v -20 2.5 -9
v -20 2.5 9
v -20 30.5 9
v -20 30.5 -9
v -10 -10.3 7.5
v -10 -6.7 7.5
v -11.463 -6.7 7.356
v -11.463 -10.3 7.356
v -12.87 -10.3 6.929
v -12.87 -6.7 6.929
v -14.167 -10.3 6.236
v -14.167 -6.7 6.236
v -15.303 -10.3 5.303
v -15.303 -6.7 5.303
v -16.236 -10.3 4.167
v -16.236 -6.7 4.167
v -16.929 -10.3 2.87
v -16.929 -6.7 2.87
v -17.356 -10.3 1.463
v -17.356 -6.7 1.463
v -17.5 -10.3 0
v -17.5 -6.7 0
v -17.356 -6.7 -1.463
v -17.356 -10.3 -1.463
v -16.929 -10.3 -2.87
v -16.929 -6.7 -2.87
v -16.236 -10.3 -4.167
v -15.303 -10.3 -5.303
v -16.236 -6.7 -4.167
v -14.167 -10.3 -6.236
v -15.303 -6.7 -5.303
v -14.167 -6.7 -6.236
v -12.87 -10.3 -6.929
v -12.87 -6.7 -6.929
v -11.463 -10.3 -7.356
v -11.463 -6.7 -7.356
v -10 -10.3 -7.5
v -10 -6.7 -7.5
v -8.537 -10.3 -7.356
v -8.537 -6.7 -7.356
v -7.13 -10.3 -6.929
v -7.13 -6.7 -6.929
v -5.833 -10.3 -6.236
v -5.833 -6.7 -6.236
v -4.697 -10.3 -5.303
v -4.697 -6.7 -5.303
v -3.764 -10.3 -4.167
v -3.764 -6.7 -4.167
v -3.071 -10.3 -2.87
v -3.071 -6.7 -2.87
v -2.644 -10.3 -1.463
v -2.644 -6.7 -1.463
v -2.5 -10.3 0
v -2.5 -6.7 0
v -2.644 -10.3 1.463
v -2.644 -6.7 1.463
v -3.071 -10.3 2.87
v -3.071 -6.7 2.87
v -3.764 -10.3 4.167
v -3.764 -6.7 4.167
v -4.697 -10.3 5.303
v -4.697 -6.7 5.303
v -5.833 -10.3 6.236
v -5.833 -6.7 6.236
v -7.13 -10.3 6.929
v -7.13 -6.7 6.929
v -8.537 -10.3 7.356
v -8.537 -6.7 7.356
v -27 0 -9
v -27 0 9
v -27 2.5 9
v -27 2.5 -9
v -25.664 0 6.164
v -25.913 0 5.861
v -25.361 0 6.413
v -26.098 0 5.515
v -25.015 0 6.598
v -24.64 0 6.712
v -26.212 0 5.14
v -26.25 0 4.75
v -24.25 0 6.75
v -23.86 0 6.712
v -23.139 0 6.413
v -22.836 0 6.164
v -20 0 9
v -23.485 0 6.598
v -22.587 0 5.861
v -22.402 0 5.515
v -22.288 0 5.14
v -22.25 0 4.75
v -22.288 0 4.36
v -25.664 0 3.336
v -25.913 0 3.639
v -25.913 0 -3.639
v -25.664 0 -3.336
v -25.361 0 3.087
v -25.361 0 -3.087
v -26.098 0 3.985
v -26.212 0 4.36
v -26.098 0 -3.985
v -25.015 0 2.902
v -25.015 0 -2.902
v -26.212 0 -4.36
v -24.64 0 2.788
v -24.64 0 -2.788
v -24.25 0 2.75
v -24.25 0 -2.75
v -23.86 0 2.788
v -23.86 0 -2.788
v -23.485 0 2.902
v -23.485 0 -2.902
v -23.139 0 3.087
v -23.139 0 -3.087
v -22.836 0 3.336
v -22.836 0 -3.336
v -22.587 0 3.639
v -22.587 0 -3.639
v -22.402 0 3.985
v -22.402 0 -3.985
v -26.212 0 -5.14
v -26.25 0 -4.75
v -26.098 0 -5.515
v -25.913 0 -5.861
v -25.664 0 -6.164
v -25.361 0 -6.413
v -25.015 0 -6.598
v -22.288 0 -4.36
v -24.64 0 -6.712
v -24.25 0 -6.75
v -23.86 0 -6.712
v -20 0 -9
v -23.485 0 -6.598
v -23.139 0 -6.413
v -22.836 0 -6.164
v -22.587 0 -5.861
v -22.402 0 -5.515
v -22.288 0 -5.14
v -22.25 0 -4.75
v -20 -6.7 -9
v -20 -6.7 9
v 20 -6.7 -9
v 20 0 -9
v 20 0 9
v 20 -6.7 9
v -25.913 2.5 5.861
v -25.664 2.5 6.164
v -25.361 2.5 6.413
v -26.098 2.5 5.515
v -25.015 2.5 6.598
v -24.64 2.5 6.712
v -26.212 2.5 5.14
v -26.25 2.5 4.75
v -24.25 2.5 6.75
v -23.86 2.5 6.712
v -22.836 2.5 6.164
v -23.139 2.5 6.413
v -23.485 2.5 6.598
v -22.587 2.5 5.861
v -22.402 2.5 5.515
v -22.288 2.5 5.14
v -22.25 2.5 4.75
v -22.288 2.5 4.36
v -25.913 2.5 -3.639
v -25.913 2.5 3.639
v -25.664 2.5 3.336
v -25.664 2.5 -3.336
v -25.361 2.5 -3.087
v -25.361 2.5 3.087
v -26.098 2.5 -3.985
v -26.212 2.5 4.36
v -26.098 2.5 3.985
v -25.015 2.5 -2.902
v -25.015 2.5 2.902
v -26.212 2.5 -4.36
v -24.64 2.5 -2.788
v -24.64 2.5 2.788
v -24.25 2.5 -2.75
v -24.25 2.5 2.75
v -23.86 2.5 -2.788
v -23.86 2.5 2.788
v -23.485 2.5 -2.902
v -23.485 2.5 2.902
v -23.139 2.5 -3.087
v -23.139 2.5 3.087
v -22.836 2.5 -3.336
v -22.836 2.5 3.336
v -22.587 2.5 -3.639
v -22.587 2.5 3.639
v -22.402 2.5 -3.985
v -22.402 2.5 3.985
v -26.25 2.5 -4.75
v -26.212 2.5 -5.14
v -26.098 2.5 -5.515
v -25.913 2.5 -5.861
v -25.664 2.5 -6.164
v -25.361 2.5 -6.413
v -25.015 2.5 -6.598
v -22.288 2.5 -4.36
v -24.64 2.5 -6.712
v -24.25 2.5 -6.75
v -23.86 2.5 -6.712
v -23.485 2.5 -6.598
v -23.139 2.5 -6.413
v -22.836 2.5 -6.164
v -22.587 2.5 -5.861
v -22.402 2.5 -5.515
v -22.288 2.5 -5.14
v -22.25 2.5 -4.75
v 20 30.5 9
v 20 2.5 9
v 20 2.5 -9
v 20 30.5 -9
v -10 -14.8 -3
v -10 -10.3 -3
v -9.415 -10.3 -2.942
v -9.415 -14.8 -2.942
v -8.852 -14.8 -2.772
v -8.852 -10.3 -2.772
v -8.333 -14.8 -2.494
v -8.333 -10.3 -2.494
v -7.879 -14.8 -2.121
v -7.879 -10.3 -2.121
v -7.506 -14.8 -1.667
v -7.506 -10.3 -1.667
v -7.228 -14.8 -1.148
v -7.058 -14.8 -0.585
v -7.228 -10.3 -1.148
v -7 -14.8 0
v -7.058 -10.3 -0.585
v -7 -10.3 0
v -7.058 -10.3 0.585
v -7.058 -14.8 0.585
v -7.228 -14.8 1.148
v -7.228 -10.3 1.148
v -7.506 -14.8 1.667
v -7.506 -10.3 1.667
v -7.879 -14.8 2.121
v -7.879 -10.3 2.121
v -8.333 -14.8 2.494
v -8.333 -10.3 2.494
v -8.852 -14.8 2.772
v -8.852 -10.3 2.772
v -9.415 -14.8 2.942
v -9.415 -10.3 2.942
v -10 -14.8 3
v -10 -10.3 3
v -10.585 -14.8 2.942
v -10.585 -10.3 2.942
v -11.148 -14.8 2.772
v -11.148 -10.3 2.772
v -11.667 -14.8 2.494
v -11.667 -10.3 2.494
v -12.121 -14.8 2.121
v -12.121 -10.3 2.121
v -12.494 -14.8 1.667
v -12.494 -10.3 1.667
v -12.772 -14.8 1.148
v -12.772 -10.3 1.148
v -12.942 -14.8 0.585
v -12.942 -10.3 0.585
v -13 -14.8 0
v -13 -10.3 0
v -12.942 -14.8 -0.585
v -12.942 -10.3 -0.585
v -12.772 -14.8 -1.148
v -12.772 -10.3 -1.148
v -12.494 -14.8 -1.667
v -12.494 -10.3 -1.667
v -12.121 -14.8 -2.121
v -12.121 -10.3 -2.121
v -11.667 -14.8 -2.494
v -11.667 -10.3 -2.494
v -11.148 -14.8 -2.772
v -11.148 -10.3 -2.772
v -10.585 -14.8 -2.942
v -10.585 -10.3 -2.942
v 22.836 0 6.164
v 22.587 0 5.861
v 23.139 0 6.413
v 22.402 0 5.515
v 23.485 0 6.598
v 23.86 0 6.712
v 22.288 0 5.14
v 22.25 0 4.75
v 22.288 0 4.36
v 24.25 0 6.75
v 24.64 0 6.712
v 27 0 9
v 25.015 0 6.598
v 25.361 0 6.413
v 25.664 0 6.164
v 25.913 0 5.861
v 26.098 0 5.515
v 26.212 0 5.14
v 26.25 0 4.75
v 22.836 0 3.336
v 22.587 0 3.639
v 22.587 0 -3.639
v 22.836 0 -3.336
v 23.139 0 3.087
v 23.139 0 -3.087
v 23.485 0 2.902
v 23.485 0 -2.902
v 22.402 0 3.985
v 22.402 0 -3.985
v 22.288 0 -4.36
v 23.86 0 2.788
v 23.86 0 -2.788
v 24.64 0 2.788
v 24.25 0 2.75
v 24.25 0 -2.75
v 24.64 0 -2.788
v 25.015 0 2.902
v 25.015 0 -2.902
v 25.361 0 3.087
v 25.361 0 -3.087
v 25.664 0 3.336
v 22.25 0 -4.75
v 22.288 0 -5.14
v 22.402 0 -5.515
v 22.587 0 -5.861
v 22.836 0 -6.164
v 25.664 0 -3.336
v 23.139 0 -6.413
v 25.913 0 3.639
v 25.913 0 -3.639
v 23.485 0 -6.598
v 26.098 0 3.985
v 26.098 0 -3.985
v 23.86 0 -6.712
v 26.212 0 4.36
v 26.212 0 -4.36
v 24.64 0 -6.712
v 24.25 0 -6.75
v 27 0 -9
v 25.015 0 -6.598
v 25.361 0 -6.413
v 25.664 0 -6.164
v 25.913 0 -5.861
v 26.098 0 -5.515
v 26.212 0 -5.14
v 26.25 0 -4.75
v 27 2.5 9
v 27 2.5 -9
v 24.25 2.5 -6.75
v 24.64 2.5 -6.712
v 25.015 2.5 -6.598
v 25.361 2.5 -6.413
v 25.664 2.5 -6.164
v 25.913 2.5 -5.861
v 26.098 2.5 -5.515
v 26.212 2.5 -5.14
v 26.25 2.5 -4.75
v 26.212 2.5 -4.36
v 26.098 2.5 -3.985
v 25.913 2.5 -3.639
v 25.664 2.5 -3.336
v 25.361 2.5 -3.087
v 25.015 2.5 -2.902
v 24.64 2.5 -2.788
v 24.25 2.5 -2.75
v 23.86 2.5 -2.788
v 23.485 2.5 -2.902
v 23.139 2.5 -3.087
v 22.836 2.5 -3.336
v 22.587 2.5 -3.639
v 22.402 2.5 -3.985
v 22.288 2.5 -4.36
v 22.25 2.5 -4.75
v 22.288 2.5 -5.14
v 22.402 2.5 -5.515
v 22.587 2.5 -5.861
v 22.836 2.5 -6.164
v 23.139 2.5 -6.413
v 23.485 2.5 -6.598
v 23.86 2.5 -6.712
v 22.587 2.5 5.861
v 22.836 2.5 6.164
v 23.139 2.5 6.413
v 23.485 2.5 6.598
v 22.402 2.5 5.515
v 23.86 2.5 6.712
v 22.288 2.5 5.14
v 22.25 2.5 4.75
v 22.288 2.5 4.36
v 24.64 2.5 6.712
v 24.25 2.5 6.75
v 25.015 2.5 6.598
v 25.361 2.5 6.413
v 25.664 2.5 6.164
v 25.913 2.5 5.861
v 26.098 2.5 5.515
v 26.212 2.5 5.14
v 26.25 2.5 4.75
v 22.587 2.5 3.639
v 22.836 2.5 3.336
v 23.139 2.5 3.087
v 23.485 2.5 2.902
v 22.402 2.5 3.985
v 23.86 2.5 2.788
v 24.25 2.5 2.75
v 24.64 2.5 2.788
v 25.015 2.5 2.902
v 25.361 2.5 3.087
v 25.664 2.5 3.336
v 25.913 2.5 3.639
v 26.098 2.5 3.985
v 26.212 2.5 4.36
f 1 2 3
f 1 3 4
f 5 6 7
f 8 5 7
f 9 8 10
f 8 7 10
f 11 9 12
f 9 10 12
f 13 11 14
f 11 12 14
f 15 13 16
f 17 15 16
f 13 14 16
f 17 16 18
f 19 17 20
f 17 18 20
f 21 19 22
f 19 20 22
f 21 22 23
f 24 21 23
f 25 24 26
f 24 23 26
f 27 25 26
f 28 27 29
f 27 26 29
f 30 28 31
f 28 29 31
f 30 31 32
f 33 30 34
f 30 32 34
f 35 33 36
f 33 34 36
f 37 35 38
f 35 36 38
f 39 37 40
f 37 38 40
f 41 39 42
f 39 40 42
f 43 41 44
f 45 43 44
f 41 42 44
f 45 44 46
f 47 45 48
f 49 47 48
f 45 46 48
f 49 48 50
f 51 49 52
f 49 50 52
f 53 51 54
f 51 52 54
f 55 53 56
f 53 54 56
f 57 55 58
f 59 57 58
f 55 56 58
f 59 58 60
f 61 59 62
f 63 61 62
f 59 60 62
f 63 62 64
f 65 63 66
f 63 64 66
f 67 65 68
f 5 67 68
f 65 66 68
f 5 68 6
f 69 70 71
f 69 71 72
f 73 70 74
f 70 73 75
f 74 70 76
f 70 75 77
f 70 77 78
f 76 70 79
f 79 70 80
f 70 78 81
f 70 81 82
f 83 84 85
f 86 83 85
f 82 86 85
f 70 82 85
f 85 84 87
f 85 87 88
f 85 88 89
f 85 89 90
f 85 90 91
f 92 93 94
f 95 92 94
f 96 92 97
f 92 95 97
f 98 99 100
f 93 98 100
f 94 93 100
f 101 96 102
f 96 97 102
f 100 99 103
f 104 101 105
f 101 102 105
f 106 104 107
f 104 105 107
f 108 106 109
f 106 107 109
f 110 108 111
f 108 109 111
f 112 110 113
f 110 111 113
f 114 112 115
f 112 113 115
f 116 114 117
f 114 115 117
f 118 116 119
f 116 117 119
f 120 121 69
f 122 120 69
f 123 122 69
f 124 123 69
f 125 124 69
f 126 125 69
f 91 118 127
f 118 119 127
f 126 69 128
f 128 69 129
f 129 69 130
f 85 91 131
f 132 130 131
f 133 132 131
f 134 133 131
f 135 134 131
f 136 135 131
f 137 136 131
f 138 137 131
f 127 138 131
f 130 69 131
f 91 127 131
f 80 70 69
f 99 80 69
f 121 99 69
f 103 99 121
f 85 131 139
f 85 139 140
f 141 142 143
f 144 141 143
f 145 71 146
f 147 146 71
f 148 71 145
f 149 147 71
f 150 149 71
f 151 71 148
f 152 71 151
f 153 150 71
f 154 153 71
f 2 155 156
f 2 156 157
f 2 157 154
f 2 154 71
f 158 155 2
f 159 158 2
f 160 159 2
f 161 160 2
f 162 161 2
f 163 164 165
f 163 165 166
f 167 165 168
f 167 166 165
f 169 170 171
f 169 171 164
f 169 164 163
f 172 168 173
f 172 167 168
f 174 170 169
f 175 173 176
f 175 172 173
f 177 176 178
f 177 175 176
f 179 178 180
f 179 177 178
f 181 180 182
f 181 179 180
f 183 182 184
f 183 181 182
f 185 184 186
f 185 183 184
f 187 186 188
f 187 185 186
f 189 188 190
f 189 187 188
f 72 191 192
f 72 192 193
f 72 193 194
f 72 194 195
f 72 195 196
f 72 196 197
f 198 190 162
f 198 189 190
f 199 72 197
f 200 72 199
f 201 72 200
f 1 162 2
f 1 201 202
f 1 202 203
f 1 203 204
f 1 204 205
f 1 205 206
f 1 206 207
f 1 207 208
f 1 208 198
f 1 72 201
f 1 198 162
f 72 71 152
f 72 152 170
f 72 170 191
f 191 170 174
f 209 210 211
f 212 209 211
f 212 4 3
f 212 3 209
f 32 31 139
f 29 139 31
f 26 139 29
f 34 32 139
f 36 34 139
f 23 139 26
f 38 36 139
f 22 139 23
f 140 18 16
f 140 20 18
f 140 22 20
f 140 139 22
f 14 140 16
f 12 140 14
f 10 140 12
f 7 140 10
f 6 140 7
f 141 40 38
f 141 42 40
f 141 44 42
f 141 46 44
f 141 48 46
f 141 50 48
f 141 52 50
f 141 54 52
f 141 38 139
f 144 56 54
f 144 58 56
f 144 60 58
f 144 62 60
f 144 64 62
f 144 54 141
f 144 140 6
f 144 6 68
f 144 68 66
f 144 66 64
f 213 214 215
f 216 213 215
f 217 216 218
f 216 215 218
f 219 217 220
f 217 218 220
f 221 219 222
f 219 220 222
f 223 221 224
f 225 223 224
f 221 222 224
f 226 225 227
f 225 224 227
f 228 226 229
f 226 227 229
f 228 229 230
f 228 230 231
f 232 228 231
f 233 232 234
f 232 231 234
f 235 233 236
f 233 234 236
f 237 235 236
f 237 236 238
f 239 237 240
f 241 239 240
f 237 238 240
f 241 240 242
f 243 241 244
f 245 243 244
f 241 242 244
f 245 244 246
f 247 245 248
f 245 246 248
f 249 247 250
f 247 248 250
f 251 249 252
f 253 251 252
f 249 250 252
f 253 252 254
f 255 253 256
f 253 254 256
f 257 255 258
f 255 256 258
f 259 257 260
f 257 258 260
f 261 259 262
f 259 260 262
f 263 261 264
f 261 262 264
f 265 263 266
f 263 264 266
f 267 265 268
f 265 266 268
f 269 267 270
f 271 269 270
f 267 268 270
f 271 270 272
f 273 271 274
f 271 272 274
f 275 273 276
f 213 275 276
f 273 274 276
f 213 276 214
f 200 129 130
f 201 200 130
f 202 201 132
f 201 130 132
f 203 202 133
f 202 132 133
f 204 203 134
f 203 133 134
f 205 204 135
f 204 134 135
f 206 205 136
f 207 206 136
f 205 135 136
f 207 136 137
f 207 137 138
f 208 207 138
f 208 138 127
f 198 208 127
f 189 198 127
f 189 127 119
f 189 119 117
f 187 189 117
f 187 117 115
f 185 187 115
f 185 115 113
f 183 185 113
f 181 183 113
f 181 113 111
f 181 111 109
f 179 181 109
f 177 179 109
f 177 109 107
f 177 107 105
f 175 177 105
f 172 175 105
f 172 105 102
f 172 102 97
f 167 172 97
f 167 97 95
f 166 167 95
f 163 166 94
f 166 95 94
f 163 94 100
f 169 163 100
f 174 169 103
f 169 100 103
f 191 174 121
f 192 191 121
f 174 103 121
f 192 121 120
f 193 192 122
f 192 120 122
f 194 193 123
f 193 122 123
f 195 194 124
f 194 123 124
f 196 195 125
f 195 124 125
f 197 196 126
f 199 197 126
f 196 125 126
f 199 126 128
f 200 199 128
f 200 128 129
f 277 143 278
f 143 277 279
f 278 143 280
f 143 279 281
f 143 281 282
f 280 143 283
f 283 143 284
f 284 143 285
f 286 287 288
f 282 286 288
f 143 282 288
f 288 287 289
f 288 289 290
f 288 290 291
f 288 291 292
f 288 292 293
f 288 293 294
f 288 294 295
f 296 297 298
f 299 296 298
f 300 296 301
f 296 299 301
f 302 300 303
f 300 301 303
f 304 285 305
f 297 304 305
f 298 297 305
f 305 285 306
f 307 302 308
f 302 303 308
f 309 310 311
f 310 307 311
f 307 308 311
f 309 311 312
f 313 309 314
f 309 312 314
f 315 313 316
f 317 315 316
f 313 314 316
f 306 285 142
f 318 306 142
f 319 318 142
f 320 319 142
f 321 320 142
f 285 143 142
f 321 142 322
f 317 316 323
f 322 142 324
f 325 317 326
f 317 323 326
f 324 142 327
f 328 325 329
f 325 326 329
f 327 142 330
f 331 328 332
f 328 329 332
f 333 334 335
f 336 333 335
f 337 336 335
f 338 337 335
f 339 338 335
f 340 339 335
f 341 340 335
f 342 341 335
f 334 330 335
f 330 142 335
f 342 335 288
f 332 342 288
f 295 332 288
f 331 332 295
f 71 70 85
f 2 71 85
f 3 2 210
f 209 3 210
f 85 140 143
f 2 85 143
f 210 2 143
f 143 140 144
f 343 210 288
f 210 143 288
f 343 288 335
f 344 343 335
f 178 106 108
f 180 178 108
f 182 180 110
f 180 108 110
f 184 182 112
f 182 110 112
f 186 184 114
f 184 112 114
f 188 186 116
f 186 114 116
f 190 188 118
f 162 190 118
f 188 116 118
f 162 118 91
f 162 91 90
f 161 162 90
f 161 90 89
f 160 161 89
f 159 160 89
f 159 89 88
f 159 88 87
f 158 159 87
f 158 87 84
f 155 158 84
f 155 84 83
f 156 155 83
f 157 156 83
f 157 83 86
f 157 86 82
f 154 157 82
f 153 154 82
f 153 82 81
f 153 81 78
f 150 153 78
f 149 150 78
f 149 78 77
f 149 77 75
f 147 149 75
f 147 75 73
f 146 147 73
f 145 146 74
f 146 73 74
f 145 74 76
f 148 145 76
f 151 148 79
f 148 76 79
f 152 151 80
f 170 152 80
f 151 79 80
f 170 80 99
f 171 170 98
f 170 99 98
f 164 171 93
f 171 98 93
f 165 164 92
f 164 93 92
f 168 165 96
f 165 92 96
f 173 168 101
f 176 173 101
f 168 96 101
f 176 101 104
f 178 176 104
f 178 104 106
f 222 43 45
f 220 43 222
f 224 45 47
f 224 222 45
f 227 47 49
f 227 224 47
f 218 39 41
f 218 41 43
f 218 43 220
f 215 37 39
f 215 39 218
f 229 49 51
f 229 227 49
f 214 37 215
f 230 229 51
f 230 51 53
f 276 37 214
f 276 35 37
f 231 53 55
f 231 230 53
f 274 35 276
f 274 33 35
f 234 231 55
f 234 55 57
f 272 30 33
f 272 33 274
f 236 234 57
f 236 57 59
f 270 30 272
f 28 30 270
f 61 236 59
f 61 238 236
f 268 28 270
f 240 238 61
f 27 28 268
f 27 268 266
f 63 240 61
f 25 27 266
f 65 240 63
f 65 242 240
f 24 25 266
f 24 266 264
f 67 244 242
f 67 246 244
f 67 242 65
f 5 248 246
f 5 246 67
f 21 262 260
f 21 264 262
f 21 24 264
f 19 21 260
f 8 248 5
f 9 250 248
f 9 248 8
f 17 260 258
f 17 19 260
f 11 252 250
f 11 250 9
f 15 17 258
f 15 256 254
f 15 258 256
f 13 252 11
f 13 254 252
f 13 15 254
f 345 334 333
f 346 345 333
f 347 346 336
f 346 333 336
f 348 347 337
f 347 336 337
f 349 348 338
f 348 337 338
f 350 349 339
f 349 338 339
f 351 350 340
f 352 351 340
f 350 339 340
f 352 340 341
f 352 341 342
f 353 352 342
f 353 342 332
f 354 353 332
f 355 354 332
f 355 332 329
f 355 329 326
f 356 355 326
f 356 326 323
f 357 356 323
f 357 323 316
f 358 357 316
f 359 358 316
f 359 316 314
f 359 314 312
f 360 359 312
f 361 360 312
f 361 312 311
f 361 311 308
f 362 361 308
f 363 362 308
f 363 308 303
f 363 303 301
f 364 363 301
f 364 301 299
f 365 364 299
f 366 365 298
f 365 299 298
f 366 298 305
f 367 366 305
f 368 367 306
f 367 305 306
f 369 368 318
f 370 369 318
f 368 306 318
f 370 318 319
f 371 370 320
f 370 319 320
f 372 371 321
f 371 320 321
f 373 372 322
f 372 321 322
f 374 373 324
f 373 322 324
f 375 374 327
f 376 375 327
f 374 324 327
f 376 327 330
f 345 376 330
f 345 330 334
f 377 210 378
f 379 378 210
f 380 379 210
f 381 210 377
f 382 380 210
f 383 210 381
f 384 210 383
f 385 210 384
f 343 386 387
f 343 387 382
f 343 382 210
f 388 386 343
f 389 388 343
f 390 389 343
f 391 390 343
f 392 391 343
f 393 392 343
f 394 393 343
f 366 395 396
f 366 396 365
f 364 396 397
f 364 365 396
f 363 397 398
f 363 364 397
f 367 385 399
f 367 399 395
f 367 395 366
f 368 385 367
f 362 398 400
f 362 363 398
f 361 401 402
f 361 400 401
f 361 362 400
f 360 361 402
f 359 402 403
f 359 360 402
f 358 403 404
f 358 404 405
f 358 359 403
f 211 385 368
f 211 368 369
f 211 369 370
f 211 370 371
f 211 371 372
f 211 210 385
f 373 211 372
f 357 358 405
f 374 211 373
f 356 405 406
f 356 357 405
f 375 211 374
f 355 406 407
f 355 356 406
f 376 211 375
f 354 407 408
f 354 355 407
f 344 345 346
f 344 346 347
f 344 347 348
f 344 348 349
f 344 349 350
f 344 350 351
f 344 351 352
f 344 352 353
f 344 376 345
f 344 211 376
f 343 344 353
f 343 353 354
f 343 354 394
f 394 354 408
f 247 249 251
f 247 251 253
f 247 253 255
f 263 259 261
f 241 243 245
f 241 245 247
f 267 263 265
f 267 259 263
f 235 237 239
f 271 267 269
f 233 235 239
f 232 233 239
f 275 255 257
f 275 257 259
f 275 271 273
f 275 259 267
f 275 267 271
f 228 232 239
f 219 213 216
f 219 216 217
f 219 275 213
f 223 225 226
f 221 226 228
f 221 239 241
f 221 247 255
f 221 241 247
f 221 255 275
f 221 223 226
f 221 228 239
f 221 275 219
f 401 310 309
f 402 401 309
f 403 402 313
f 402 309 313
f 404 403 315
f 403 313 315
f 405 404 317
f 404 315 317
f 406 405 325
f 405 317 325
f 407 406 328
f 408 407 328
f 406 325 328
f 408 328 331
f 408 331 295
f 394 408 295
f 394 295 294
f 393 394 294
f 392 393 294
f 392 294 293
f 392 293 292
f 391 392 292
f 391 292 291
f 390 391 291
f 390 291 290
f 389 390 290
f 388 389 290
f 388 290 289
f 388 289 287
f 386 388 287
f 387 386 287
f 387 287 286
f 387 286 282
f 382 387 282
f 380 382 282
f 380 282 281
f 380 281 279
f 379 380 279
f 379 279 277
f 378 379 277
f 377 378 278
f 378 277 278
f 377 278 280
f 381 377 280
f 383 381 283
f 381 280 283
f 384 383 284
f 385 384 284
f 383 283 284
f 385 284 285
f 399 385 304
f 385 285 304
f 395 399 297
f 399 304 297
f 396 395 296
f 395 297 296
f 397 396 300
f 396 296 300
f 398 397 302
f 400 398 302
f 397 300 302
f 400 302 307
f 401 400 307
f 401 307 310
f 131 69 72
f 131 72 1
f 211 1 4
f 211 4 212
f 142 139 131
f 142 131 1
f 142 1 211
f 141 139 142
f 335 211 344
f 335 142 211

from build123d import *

# Parameters (mm, degrees)
SKETCH_1_W          = 54
SKETCH_1_H          = 18
EXTRUDE_1_DEPTH     = 2.5
SKETCH_2_W          = 40
SKETCH_2_H          = 18
EXTRUDE_2_DEPTH     = 28
SKETCH_3_W          = 40
SKETCH_3_H          = 18
EXTRUDE_3_DEPTH     = 6.7
SKETCH_4_R          = 7.5
EXTRUDE_4_DEPTH     = 3.6
SKETCH_5_R          = 3
EXTRUDE_5_DEPTH     = 4.5
SKETCH_6_R          = 2
CUT_EXTRUDE_1_DEPTH = 4.5


with BuildPart() as part:
    # 草图1 → 凸台-拉伸1 (new body)
    with BuildSketch(Plane(origin=(0, 0, 0), x_dir=(1, 0, 0), z_dir=(0, 1, 0))):
        Rectangle(SKETCH_1_W, SKETCH_1_H)
    extrude(amount=EXTRUDE_1_DEPTH)

    # 草图2 → 凸台-拉伸2 (add)
    with BuildSketch(Plane(origin=(0, 2.5, 0), x_dir=(1, 0, 0), z_dir=(0, 1, 0))):
        Rectangle(SKETCH_2_W, SKETCH_2_H)
    extrude(amount=EXTRUDE_2_DEPTH)

    # 草图3 → 凸台-拉伸3 (add)
    with BuildSketch(Plane.XZ):
        Rectangle(SKETCH_3_W, SKETCH_3_H)
    extrude(amount=EXTRUDE_3_DEPTH)

    # 草图4 → 凸台-拉伸4 (add)
    with BuildSketch(Plane.XZ.offset(6.7)):
        with Locations(Location((-10, 0, 0), (0, 0, 90))):
            Circle(SKETCH_4_R)
    extrude(amount=EXTRUDE_4_DEPTH)

    # 草图5 → 凸台-拉伸5 (add)
    with BuildSketch(Plane.XZ.offset(10.3)):
        with Locations(Location((-10, 0, 0), (0, 0, 270))):
            Circle(SKETCH_5_R)
    extrude(amount=EXTRUDE_5_DEPTH)

    # 草图6 → 切除-拉伸1 (cut)
    with BuildSketch(Plane.XZ):
        with Locations(Location((-24.25, 4.75, 0), (0, 0, 270))):
            Circle(SKETCH_6_R)
        with Locations(Location((-24.25, -4.75, 0), (0, 0, 270))):
            Circle(SKETCH_6_R)
        with Locations(Location((24.25, 4.75, 0), (0, 0, 270))):
            Circle(SKETCH_6_R)
        with Locations(Location((24.25, -4.75, 0), (0, 0, 270))):
            Circle(SKETCH_6_R)
    extrude(amount=-CUT_EXTRUDE_1_DEPTH, mode=Mode.SUBTRACT)


solid = part.part
